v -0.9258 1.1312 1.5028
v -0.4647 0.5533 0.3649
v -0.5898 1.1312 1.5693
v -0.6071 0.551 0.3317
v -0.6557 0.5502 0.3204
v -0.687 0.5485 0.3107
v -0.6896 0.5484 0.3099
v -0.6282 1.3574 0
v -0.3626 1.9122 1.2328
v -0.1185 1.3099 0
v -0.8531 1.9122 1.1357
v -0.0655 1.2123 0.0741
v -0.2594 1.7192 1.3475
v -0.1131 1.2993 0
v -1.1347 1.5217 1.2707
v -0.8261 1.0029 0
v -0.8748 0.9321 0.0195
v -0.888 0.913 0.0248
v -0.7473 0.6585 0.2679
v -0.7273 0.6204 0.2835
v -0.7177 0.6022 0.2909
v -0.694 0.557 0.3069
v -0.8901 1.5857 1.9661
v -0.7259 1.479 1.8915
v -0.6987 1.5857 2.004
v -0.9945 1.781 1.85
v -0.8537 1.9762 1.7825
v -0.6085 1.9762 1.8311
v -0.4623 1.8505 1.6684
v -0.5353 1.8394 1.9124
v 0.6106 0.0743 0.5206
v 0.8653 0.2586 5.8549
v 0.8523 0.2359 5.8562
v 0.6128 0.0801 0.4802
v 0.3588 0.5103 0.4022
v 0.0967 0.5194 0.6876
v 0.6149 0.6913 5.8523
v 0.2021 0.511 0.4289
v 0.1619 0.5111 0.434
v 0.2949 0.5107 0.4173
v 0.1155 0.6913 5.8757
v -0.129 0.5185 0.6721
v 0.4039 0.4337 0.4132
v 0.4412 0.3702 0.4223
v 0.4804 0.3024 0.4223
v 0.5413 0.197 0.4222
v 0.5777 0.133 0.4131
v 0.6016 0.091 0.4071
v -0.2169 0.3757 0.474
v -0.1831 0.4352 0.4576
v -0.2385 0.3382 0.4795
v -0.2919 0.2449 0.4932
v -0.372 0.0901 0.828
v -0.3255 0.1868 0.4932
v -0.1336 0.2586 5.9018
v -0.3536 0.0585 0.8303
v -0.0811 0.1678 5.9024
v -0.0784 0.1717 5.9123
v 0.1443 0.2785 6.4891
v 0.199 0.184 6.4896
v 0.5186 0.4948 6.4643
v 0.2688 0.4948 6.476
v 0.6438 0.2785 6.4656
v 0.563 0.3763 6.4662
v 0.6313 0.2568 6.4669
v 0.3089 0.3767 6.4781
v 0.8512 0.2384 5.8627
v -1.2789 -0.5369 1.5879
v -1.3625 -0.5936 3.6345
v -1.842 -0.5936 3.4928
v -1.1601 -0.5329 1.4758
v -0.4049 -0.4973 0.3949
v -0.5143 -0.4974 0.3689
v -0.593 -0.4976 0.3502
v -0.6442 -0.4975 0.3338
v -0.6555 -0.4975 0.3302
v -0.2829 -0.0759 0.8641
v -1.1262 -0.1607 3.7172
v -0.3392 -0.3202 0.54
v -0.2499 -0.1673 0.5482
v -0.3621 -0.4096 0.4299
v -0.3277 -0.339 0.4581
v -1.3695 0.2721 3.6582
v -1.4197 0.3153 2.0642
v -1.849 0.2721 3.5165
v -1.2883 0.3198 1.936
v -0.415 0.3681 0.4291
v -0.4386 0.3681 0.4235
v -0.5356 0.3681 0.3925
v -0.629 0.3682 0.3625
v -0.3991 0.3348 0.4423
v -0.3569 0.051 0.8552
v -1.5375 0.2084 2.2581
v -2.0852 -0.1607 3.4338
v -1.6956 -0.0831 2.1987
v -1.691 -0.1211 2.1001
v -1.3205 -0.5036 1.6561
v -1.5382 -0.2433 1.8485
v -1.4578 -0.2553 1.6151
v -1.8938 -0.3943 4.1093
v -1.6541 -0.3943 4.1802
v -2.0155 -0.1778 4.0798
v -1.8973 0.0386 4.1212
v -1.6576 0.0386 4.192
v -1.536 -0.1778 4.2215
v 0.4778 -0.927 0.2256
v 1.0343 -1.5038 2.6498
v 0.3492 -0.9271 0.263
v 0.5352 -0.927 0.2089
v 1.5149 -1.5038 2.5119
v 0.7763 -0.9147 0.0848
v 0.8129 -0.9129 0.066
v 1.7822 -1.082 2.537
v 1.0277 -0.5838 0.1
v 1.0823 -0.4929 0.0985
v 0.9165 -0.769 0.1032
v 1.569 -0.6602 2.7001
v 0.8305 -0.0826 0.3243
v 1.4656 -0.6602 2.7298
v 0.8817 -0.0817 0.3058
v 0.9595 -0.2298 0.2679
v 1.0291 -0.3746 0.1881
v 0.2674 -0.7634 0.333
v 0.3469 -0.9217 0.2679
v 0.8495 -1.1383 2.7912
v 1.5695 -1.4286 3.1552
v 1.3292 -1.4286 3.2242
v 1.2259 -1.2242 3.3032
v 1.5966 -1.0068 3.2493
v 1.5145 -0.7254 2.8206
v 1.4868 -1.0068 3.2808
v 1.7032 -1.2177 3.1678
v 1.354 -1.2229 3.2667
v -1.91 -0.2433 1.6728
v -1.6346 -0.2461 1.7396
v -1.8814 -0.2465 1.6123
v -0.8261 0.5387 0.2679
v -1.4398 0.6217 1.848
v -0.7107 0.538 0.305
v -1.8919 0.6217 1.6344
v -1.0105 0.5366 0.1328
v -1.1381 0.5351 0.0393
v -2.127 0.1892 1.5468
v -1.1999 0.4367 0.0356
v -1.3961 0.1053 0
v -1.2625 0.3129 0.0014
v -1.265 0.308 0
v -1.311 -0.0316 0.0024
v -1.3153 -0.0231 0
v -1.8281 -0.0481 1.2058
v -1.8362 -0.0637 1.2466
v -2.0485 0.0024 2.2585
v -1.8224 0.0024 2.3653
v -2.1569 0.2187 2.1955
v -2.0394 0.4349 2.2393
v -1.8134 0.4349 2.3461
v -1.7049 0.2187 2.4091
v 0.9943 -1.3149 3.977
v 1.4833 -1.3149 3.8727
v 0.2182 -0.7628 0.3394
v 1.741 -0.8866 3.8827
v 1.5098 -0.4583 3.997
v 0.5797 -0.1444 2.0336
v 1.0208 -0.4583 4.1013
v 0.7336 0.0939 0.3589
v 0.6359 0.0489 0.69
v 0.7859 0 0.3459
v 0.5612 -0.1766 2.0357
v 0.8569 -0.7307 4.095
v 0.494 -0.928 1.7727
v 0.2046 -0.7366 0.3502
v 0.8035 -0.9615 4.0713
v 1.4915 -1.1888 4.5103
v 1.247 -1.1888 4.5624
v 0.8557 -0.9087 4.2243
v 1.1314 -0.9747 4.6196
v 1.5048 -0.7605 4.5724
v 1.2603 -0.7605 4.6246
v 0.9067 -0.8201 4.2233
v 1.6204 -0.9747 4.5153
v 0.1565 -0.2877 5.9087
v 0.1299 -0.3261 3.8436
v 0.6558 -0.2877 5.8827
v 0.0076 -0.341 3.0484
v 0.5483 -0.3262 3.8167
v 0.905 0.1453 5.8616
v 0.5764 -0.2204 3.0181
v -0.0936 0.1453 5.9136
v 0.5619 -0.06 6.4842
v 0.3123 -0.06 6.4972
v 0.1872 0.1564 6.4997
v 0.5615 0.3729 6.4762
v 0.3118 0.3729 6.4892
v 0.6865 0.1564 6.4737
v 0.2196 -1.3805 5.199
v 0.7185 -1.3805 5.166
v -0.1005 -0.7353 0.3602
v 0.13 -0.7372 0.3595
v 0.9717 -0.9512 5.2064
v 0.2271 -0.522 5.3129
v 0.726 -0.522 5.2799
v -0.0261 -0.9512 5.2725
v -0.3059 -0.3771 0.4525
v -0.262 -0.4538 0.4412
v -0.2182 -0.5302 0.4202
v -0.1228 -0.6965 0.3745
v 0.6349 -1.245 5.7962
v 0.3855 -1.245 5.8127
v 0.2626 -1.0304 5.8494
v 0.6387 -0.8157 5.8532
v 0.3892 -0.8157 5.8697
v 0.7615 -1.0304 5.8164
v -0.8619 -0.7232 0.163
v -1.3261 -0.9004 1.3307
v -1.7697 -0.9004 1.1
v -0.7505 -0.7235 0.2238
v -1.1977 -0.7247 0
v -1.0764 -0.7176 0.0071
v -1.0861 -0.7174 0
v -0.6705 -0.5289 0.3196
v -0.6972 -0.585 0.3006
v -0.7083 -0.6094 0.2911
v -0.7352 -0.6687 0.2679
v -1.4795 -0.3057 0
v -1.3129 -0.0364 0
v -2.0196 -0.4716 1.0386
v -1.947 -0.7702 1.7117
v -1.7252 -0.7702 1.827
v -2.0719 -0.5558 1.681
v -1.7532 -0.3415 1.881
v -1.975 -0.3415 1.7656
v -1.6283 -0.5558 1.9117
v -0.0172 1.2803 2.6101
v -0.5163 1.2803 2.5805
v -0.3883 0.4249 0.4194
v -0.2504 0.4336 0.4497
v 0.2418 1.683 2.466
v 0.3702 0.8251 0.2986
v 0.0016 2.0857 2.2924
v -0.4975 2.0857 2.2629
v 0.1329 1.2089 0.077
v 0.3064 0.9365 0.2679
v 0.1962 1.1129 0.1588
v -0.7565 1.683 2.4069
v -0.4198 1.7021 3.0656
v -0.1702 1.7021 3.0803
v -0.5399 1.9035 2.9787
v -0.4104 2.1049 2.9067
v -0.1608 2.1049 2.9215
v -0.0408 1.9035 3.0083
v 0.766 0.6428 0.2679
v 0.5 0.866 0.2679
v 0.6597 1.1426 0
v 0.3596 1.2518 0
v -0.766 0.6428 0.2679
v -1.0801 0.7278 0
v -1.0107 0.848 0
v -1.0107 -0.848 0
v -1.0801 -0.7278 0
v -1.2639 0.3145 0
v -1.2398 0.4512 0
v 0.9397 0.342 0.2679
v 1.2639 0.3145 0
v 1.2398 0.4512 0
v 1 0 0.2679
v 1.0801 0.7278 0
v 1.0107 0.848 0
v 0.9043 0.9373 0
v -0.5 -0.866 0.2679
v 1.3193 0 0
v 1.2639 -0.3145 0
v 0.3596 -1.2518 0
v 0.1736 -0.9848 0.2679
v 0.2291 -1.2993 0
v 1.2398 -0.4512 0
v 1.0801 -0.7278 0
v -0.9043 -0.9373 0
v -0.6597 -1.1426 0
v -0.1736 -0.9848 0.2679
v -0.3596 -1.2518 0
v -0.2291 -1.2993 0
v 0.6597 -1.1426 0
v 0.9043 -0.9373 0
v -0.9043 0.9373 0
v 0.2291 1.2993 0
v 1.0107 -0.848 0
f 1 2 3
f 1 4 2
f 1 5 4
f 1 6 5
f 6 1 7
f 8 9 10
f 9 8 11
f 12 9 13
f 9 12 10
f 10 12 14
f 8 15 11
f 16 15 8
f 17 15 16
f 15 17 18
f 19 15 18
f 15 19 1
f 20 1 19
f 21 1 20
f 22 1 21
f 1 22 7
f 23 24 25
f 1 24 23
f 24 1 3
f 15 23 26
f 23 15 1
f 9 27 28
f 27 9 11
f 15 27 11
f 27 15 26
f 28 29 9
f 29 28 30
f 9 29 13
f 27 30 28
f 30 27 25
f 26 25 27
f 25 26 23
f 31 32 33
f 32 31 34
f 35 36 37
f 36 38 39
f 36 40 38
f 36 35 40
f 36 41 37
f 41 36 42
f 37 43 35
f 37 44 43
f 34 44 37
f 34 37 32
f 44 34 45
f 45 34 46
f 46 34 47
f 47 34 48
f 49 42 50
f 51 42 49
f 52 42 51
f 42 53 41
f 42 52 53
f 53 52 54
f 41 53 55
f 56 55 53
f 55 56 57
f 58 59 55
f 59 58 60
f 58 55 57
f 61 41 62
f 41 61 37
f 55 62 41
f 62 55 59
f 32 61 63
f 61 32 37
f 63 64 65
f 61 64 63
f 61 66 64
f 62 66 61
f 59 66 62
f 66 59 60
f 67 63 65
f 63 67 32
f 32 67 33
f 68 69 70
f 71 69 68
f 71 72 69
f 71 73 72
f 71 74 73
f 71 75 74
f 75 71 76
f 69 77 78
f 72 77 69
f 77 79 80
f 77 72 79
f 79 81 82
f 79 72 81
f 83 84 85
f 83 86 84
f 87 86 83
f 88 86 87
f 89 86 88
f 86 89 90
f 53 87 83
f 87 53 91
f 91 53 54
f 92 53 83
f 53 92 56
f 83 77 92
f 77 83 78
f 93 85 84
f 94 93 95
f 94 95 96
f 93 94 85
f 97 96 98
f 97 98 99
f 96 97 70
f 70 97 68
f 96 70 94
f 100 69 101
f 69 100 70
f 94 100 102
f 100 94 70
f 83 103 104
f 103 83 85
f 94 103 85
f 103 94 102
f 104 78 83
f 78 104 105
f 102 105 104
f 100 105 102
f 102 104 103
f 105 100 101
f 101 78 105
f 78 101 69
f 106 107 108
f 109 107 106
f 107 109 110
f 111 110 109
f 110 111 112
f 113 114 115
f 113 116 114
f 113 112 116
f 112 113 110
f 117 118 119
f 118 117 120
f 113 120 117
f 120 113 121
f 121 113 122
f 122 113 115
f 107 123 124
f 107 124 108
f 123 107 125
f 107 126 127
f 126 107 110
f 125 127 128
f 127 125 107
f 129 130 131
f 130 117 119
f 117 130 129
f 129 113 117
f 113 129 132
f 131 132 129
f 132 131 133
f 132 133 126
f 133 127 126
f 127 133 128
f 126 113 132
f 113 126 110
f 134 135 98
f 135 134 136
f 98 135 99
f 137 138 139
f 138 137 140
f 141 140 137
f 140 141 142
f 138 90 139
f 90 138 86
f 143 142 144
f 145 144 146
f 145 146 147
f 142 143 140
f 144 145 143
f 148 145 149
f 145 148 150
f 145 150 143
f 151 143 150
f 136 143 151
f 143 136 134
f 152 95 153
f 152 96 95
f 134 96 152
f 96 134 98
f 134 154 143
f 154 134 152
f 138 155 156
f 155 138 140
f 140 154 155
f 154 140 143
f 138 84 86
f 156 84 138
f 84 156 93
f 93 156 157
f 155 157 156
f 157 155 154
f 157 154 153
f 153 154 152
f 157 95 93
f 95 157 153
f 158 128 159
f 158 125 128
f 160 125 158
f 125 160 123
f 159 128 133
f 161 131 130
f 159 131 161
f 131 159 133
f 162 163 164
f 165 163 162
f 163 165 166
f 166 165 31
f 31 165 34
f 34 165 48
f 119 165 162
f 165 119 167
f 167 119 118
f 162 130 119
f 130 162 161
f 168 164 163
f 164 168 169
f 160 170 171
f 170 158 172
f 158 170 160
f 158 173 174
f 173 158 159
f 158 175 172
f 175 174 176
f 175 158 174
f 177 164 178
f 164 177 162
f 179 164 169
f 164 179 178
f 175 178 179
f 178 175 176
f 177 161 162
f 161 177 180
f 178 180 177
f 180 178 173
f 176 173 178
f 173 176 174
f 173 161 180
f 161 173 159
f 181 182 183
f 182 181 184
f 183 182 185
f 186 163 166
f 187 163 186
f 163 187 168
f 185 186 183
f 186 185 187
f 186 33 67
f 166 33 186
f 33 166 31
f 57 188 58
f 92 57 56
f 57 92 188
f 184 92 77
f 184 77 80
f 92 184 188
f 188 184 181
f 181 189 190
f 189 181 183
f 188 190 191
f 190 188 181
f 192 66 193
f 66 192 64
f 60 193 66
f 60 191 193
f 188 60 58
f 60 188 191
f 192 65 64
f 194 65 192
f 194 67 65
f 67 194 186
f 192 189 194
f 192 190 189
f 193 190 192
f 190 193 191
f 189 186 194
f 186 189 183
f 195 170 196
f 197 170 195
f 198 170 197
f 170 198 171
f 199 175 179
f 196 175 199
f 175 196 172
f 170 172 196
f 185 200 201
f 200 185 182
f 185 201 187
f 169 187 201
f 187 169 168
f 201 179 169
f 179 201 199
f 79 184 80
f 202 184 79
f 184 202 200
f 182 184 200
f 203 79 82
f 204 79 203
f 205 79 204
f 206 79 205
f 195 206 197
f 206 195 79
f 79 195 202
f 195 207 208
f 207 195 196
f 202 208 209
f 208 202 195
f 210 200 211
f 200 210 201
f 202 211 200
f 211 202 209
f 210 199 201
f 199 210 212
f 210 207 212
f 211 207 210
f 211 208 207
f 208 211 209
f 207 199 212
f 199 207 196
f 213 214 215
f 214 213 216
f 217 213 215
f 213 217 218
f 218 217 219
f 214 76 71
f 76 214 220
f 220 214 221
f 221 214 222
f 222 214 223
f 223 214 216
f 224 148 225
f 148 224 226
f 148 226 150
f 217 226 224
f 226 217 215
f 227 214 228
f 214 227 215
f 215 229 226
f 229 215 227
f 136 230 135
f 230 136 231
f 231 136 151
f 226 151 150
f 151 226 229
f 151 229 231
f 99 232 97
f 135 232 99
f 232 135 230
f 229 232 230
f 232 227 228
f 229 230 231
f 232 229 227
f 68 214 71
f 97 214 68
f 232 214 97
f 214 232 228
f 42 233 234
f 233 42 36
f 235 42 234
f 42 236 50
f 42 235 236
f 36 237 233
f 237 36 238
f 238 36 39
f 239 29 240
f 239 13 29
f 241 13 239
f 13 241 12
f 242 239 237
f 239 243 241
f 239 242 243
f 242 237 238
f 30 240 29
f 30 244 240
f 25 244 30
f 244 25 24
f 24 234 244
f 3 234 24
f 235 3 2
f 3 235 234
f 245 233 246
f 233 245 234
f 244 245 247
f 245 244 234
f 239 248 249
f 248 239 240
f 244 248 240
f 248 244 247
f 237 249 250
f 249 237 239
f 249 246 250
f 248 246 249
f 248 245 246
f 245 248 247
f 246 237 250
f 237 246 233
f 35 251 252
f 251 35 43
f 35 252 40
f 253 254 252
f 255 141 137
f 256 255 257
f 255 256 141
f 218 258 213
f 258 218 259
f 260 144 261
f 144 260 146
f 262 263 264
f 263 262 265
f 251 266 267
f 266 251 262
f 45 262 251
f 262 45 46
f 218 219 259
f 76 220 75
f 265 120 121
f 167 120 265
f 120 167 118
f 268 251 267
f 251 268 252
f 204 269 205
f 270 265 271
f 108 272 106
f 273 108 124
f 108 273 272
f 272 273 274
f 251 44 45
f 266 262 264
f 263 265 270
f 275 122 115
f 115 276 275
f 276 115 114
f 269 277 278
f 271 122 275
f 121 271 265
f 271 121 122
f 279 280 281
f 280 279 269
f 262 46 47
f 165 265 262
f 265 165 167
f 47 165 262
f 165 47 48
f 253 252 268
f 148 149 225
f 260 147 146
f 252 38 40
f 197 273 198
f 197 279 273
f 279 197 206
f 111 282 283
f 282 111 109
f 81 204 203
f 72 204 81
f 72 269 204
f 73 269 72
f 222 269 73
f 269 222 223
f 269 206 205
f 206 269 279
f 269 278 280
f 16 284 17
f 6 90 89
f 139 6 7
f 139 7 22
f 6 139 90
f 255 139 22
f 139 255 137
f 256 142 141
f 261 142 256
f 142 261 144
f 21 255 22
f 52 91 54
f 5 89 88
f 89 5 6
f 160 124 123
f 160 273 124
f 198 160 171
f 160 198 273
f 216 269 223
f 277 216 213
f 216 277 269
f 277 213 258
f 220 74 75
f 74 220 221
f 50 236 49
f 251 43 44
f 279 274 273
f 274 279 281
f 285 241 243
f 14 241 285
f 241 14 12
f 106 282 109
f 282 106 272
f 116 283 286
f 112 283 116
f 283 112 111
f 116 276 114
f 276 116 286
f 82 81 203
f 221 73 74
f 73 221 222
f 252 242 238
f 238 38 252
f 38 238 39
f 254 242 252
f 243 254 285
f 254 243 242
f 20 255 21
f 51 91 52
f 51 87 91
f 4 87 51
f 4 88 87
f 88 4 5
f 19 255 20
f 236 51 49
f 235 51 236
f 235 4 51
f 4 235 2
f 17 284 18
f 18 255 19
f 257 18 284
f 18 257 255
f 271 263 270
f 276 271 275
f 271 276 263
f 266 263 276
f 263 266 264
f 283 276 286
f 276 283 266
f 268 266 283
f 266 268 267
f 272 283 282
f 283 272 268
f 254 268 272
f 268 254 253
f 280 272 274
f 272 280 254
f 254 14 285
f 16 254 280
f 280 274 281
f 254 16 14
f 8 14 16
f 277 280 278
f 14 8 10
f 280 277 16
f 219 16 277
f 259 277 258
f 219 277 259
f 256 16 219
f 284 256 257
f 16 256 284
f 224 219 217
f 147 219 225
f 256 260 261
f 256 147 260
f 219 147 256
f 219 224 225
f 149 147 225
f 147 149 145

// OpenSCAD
// [FL_INDEX: keywords="openscad, 3d_parametric, Custom_Crystals, csg_solid" | COT="Parametric OpenSCAD design from 3DCodeverse"]
// Title: Custom Crystals

//A way to save your "random" arrangement
seed=74;				
//Number of crystals
num=10;							
//Width of crystals
wide=1;
//Height of each crystal
high=6;
//Number of sides on each crystal
side=6;
//Lower numbers will have shorter outer crystals
dropoff=.8;
//Overhang angle of the outermost crystals
bouquet_angle=30;
//The density of the crystals
density=10;
R_max=wide*num/density;
angle=rands(0,360*10,num+1,seed);
rad=rands(0,R_max,num+1,seed);
hyp=R_max/sin(bouquet_angle);
adj=R_max*cos(bouquet_angle)/sin(bouquet_angle);
difference(){
	union(){
	translate([0,0,-2*adj+hyp]) 
		sphere(hyp,$fn=3*side);
	for(i=[1:num]){
		translate([rad[i]*cos(angle[i]),rad[i]*sin(angle[i]),0]) 
			rotate([-bouquet_angle*sin(angle[i])*rad[i]/R_max,bouquet_angle*cos(angle[i])*rad[i]/R_max,0])
				crystal(side,high*exp(-pow((rad[i]/(dropoff*R_max)),2)),wide/2,(high)/10);
		}
	}
	translate([0,0,-hyp]) 
		cube(2*hyp,true);
	}

module crystal(sides, height, width, taper_height){
	cylinder(height,width,width,$fn=sides);
	translate([0,0,height]) 
		cylinder(taper_height,width,width/2,$fn=sides);
	}
